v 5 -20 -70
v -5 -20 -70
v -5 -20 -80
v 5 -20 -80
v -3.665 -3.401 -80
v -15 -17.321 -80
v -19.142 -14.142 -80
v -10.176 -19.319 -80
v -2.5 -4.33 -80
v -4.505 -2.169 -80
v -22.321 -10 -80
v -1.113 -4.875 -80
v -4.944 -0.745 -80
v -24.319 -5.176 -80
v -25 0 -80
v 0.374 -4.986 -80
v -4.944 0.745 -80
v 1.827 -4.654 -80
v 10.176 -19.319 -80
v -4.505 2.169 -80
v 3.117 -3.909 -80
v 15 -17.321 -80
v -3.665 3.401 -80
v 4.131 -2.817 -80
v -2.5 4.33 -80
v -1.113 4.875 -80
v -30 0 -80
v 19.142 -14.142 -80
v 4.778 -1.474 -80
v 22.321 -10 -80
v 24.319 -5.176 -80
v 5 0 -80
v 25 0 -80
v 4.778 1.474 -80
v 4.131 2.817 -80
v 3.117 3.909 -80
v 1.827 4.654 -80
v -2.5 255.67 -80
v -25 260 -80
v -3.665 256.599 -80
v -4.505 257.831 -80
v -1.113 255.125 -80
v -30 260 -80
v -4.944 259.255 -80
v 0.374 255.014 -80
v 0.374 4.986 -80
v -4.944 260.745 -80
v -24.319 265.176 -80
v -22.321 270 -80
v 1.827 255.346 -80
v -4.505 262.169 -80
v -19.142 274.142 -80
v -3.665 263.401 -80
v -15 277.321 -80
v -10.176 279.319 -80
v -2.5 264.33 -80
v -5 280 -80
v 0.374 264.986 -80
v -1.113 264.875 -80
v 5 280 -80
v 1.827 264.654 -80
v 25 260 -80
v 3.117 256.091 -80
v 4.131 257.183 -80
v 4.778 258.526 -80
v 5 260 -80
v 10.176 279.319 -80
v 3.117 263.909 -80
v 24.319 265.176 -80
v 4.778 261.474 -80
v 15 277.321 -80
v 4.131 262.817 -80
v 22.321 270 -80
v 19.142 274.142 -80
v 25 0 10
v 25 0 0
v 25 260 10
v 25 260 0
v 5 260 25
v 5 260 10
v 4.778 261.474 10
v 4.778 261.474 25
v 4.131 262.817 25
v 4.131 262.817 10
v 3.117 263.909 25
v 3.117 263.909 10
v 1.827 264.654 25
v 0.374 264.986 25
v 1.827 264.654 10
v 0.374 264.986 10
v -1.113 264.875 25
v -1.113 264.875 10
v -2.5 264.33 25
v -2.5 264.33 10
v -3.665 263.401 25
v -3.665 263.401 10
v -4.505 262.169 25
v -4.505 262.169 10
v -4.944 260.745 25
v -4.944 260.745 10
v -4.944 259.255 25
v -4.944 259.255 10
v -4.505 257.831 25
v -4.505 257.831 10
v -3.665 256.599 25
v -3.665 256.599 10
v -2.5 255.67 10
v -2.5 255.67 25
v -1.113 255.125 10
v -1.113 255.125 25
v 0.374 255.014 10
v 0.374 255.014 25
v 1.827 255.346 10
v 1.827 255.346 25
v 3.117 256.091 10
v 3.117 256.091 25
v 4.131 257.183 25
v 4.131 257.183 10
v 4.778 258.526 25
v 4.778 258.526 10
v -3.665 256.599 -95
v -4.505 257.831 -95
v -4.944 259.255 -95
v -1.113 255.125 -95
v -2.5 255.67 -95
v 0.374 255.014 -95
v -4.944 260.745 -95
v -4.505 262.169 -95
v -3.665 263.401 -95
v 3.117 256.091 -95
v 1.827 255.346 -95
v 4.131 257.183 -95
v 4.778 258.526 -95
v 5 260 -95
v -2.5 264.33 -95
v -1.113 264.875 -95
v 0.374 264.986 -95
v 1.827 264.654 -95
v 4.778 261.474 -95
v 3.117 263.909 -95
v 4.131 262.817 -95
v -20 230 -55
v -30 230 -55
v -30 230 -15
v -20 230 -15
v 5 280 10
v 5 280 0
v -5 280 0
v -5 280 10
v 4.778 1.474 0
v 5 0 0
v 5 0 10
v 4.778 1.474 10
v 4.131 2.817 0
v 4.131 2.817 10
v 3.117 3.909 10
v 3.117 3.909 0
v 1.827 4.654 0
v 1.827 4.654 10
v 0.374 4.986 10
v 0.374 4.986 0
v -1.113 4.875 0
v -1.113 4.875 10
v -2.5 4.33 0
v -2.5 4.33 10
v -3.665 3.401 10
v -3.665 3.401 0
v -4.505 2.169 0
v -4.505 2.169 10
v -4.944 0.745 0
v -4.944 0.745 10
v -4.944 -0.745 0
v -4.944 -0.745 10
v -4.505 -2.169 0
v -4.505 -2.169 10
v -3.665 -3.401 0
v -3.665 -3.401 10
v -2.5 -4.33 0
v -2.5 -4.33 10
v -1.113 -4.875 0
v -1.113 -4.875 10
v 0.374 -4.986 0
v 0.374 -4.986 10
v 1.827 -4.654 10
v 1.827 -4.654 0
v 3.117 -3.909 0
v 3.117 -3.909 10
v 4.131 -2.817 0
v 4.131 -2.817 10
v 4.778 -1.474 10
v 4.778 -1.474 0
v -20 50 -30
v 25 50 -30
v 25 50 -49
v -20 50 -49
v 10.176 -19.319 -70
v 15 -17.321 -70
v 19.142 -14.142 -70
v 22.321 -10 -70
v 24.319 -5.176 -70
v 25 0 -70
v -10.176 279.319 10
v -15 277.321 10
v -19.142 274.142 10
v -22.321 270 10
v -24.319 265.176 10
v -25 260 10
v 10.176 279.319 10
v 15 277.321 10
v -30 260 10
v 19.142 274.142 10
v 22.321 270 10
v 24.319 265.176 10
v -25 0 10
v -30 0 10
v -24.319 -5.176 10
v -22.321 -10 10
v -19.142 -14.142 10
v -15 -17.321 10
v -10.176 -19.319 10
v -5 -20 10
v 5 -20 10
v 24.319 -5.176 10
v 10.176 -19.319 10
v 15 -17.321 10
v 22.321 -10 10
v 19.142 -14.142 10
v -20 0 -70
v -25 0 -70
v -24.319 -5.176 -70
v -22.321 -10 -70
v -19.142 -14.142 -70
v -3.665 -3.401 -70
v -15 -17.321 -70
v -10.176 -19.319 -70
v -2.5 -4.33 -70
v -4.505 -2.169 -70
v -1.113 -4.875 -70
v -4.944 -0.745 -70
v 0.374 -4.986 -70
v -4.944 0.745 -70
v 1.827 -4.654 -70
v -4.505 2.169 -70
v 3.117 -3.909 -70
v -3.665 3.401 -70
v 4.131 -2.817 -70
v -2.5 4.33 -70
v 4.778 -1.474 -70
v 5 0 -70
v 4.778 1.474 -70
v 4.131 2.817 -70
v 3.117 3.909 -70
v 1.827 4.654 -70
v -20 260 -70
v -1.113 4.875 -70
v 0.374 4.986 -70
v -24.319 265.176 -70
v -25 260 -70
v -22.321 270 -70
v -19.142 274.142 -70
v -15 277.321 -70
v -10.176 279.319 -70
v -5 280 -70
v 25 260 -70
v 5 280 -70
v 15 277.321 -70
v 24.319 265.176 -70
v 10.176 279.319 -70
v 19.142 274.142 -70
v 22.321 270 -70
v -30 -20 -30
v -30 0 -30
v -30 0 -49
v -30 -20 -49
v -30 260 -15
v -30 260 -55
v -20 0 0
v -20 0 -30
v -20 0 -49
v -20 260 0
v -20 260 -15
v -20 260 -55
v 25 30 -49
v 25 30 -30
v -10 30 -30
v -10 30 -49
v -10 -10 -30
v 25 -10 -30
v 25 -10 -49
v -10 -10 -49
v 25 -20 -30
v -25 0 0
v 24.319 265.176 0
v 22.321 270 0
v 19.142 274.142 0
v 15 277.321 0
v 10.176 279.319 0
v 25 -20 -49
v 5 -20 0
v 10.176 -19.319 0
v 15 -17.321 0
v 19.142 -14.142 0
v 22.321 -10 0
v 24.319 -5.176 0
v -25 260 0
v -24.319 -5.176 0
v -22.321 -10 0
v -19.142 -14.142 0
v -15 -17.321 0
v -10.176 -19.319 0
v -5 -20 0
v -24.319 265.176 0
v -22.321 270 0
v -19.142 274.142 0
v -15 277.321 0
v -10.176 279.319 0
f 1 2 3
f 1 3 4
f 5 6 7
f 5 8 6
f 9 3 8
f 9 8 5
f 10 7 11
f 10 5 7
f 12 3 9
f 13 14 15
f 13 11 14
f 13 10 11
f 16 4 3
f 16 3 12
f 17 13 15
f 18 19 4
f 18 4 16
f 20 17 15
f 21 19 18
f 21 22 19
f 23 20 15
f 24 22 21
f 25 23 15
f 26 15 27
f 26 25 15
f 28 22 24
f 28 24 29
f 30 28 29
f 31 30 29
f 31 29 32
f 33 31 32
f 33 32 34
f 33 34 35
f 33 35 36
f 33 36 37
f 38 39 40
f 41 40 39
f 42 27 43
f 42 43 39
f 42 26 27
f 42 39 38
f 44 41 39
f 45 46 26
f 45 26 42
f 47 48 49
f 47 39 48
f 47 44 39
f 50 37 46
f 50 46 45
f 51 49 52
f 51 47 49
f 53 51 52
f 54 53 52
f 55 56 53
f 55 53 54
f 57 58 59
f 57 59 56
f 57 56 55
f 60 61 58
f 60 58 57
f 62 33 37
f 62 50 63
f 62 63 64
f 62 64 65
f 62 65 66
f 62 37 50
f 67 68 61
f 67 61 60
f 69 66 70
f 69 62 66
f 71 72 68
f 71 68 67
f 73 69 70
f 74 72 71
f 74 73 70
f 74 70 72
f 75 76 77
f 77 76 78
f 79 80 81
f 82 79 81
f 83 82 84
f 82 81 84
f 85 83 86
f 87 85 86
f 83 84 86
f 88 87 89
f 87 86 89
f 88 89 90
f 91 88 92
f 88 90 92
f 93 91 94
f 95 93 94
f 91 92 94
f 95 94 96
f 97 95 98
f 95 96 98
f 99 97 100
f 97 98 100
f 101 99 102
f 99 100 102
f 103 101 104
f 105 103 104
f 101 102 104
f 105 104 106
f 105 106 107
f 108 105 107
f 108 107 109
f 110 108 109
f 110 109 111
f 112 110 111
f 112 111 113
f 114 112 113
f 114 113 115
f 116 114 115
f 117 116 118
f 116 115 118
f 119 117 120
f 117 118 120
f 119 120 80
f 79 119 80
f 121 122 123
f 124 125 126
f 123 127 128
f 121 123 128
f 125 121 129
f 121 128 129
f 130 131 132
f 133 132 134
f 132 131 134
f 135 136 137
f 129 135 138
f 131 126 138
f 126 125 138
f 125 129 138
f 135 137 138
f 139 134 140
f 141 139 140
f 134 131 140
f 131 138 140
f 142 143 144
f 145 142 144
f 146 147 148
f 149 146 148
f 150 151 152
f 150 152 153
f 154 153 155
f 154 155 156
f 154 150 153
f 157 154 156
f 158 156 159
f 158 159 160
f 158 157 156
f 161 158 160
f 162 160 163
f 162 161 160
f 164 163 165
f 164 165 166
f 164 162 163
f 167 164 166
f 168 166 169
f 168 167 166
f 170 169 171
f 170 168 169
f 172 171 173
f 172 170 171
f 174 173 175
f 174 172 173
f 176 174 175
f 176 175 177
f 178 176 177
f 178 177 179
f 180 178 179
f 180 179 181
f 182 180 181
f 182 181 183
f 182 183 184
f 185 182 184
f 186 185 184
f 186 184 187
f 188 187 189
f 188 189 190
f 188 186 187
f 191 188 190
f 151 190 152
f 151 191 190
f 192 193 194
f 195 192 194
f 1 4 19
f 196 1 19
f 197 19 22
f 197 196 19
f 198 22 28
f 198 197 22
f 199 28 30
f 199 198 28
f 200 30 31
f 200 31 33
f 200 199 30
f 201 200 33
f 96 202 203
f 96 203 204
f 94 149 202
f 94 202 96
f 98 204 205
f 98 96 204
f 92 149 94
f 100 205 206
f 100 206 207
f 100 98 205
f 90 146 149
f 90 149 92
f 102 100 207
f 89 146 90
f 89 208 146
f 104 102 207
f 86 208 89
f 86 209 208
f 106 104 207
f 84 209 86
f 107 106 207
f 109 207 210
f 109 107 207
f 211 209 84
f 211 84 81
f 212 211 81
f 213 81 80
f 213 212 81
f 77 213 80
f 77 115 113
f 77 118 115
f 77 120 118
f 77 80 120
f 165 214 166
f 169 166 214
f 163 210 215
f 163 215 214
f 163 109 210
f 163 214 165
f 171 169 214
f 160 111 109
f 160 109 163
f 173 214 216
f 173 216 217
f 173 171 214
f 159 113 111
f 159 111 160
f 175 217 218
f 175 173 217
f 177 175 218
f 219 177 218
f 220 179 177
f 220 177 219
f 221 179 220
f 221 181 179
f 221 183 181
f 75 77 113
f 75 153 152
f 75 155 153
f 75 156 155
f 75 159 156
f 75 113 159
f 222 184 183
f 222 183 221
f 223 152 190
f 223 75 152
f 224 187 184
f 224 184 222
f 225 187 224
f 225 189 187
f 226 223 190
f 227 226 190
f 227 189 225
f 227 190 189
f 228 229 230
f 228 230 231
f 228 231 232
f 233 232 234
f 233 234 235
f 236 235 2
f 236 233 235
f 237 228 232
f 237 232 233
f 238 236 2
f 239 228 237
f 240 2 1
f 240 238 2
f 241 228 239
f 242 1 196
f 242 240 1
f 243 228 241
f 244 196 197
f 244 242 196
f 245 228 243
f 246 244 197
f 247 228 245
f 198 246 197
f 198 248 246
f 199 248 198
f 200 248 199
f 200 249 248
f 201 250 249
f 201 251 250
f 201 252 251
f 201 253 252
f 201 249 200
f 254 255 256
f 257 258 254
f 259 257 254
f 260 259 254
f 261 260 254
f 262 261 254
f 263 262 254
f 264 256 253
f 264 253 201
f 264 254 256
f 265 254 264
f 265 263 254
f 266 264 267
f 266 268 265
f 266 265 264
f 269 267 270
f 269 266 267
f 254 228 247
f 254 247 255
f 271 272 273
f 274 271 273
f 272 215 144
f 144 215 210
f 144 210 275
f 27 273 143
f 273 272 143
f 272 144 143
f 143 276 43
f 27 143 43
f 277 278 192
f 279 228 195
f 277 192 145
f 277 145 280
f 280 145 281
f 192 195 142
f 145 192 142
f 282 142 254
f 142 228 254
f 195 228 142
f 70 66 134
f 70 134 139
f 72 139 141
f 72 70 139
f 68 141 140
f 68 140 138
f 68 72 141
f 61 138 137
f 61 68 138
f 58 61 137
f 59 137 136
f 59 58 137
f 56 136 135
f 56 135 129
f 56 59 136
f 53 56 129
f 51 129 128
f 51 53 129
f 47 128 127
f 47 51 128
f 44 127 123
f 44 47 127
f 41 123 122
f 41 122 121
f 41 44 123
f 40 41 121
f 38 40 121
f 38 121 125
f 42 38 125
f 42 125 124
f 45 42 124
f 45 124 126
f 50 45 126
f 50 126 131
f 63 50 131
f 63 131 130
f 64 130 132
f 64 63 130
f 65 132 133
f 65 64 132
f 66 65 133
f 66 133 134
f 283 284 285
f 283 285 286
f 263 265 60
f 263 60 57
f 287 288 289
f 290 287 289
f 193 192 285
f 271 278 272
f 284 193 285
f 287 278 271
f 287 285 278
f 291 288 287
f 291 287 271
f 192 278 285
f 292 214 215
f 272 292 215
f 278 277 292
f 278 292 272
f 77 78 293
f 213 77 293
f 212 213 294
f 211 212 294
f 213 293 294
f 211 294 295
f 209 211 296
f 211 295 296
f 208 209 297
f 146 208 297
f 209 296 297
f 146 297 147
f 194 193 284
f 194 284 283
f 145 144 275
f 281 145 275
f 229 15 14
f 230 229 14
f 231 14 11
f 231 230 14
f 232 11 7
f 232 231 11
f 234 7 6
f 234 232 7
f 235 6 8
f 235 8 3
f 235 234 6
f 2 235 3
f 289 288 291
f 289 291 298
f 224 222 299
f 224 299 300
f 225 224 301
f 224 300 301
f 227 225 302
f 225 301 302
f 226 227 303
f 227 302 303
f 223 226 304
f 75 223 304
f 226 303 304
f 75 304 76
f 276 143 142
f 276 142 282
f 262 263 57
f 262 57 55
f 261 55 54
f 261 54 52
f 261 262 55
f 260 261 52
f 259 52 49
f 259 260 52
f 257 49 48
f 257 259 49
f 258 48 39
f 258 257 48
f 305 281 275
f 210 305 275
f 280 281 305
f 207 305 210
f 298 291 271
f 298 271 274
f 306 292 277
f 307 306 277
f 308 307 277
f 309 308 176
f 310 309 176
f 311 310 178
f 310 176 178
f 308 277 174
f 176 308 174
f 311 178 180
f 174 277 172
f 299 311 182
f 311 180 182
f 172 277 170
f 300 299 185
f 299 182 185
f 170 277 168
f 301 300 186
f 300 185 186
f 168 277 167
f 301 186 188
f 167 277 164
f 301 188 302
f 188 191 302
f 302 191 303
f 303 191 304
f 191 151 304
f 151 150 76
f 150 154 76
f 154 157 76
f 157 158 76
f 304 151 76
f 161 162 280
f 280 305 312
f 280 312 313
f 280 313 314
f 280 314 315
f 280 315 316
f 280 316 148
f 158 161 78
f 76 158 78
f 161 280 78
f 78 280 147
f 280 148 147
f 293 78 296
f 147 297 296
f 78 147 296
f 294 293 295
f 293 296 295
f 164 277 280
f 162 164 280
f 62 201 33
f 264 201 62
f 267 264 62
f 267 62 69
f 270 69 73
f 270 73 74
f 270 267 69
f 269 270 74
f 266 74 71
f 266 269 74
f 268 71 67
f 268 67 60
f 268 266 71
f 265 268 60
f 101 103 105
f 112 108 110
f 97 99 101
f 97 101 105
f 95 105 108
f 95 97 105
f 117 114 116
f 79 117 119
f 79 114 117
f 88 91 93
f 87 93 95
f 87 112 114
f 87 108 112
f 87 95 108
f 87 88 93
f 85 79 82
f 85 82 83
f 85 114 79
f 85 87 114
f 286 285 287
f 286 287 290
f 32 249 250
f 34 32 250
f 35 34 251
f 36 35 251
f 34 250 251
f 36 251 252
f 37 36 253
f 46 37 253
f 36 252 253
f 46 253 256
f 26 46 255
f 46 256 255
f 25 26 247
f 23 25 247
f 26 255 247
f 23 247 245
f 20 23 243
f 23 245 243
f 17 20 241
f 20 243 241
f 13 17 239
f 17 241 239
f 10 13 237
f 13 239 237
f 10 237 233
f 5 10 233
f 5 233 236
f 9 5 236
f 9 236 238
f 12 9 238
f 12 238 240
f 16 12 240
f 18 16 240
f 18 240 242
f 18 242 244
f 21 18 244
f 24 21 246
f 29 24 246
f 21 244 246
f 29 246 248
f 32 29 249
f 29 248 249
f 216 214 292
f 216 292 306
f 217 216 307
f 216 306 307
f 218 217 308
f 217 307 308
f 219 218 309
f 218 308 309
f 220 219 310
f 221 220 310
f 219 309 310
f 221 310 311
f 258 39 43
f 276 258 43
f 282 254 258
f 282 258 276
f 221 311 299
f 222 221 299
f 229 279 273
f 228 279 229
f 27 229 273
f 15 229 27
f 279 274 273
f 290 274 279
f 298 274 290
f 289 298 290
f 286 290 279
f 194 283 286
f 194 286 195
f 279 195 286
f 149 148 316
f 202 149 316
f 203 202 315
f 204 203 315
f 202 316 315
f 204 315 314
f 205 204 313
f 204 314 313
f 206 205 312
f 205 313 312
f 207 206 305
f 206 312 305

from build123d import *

# Parameters (mm, degrees)
SKETCH1_R           = 5
BOSS_EXTRUDE1_DEPTH = 10
SKETCH2_R           = 5
BOSS_EXTRUDE2_DEPTH = 15
SKETCH3_W           = 5
SKETCH3_H           = 260
BOSS_EXTRUDE3_DEPTH = 35
SKETCH8_W           = 5
SKETCH8_H           = 19
BOSS_EXTRUDE4_DEPTH = 20
SKETCH9_W           = 19
SKETCH9_H           = 10
SKETCH9_H_2         = 20
BOSS_EXTRUDE5_DEPTH = 45
SKETCH10_W          = 19
SKETCH10_H          = 40
BOSS_EXTRUDE6_DEPTH = 10
BOSS_EXTRUDE7_DEPTH = 5
SKETCH12_W          = 40
SKETCH12_H          = 30
CUT_EXTRUDE1_DEPTH  = 10


with BuildPart() as part:
    # Sketch1 → Boss-Extrude1 (new body)
    with BuildSketch(Plane.XY):
        with BuildLine():
            Line((-5, -20), (5, -20))
            ThreePointArc((5, -20), (19.142135624, -14.142135624), (25, 0))
            Line((25, 0), (25, 260))
            ThreePointArc((25, 260), (19.142135624, 274.142135624), (5, 280))
            Line((5, 280), (-5, 280))
            ThreePointArc((-5, 280), (-19.142135624, 274.142135624), (-25, 260))
            Line((-25, 260), (-25, 0))
            ThreePointArc((-25, 0), (-19.142135624, -14.142135624), (-5, -20))
        make_face()
        Circle(SKETCH1_R, mode=Mode.SUBTRACT)
    boss_extrude1 = extrude(amount=BOSS_EXTRUDE1_DEPTH)

    # Sketch2 → Boss-Extrude2 (add)
    with BuildSketch(Plane.XY.offset(10)):
        with Locations((0, 260)):
            Circle(SKETCH2_R)
    boss_extrude2 = extrude(amount=BOSS_EXTRUDE2_DEPTH)

    # Sketch3 → Boss-Extrude3 (add)
    with BuildSketch(Plane(origin=(0, 0, 0), x_dir=(-1, 0, 0), z_dir=(0, 0, -1))):
        with Locations((22.5, 130)):
            Rectangle(SKETCH3_W, SKETCH3_H)
    boss_extrude3 = extrude(amount=BOSS_EXTRUDE3_DEPTH)

    # Mirror1: Boss-Extrude1, Boss-Extrude2, Boss-Extrude3 across plane
    add(boss_extrude1.mirror(Plane.XY.offset(-35)))
    add(boss_extrude2.mirror(Plane.XY.offset(-35)))
    add(boss_extrude3.mirror(Plane.XY.offset(-35)))

    # Sketch8 → Boss-Extrude4 (add)
    with BuildSketch(Plane.XZ):
        with Locations((-22.5, -39.5)):
            Rectangle(SKETCH8_W, SKETCH8_H)
    extrude(amount=BOSS_EXTRUDE4_DEPTH)

    # Sketch9 → Boss-Extrude5 (add)
    with BuildSketch(Plane(origin=(-20, 0, 0), x_dir=(0, 0, -1), z_dir=(1, 0, 0))):
        with Locations((39.5, -15)):
            Rectangle(SKETCH9_W, SKETCH9_H)
        with Locations((39.5, 40)):
            Rectangle(SKETCH9_W, SKETCH9_H_2)
    extrude(amount=BOSS_EXTRUDE5_DEPTH)

    # Sketch10 → Boss-Extrude6 (add)
    with BuildSketch(Plane(origin=(-20, 0, 0), x_dir=(0, 0, -1), z_dir=(1, 0, 0))):
        with Locations((39.5, 10)):
            Rectangle(SKETCH10_W, SKETCH10_H)
    extrude(amount=BOSS_EXTRUDE6_DEPTH)

    # Sketch11 → Boss-Extrude7 (add)
    with BuildSketch(Plane.ZY.offset(25)):
        Polygon((10, 0), (-30, 0), (-30, -20), (-49, -20), (-49, 0), (-80, 0), (-80, 260), (10, 260), align=None)
    extrude(amount=BOSS_EXTRUDE7_DEPTH)

    # Sketch12 → Cut-Extrude1 (cut)
    with BuildSketch(Plane.ZY.offset(30)):
        with Locations((-35, 245)):
            Rectangle(SKETCH12_W, SKETCH12_H)
    extrude(amount=-CUT_EXTRUDE1_DEPTH, mode=Mode.SUBTRACT)


solid = part.part
